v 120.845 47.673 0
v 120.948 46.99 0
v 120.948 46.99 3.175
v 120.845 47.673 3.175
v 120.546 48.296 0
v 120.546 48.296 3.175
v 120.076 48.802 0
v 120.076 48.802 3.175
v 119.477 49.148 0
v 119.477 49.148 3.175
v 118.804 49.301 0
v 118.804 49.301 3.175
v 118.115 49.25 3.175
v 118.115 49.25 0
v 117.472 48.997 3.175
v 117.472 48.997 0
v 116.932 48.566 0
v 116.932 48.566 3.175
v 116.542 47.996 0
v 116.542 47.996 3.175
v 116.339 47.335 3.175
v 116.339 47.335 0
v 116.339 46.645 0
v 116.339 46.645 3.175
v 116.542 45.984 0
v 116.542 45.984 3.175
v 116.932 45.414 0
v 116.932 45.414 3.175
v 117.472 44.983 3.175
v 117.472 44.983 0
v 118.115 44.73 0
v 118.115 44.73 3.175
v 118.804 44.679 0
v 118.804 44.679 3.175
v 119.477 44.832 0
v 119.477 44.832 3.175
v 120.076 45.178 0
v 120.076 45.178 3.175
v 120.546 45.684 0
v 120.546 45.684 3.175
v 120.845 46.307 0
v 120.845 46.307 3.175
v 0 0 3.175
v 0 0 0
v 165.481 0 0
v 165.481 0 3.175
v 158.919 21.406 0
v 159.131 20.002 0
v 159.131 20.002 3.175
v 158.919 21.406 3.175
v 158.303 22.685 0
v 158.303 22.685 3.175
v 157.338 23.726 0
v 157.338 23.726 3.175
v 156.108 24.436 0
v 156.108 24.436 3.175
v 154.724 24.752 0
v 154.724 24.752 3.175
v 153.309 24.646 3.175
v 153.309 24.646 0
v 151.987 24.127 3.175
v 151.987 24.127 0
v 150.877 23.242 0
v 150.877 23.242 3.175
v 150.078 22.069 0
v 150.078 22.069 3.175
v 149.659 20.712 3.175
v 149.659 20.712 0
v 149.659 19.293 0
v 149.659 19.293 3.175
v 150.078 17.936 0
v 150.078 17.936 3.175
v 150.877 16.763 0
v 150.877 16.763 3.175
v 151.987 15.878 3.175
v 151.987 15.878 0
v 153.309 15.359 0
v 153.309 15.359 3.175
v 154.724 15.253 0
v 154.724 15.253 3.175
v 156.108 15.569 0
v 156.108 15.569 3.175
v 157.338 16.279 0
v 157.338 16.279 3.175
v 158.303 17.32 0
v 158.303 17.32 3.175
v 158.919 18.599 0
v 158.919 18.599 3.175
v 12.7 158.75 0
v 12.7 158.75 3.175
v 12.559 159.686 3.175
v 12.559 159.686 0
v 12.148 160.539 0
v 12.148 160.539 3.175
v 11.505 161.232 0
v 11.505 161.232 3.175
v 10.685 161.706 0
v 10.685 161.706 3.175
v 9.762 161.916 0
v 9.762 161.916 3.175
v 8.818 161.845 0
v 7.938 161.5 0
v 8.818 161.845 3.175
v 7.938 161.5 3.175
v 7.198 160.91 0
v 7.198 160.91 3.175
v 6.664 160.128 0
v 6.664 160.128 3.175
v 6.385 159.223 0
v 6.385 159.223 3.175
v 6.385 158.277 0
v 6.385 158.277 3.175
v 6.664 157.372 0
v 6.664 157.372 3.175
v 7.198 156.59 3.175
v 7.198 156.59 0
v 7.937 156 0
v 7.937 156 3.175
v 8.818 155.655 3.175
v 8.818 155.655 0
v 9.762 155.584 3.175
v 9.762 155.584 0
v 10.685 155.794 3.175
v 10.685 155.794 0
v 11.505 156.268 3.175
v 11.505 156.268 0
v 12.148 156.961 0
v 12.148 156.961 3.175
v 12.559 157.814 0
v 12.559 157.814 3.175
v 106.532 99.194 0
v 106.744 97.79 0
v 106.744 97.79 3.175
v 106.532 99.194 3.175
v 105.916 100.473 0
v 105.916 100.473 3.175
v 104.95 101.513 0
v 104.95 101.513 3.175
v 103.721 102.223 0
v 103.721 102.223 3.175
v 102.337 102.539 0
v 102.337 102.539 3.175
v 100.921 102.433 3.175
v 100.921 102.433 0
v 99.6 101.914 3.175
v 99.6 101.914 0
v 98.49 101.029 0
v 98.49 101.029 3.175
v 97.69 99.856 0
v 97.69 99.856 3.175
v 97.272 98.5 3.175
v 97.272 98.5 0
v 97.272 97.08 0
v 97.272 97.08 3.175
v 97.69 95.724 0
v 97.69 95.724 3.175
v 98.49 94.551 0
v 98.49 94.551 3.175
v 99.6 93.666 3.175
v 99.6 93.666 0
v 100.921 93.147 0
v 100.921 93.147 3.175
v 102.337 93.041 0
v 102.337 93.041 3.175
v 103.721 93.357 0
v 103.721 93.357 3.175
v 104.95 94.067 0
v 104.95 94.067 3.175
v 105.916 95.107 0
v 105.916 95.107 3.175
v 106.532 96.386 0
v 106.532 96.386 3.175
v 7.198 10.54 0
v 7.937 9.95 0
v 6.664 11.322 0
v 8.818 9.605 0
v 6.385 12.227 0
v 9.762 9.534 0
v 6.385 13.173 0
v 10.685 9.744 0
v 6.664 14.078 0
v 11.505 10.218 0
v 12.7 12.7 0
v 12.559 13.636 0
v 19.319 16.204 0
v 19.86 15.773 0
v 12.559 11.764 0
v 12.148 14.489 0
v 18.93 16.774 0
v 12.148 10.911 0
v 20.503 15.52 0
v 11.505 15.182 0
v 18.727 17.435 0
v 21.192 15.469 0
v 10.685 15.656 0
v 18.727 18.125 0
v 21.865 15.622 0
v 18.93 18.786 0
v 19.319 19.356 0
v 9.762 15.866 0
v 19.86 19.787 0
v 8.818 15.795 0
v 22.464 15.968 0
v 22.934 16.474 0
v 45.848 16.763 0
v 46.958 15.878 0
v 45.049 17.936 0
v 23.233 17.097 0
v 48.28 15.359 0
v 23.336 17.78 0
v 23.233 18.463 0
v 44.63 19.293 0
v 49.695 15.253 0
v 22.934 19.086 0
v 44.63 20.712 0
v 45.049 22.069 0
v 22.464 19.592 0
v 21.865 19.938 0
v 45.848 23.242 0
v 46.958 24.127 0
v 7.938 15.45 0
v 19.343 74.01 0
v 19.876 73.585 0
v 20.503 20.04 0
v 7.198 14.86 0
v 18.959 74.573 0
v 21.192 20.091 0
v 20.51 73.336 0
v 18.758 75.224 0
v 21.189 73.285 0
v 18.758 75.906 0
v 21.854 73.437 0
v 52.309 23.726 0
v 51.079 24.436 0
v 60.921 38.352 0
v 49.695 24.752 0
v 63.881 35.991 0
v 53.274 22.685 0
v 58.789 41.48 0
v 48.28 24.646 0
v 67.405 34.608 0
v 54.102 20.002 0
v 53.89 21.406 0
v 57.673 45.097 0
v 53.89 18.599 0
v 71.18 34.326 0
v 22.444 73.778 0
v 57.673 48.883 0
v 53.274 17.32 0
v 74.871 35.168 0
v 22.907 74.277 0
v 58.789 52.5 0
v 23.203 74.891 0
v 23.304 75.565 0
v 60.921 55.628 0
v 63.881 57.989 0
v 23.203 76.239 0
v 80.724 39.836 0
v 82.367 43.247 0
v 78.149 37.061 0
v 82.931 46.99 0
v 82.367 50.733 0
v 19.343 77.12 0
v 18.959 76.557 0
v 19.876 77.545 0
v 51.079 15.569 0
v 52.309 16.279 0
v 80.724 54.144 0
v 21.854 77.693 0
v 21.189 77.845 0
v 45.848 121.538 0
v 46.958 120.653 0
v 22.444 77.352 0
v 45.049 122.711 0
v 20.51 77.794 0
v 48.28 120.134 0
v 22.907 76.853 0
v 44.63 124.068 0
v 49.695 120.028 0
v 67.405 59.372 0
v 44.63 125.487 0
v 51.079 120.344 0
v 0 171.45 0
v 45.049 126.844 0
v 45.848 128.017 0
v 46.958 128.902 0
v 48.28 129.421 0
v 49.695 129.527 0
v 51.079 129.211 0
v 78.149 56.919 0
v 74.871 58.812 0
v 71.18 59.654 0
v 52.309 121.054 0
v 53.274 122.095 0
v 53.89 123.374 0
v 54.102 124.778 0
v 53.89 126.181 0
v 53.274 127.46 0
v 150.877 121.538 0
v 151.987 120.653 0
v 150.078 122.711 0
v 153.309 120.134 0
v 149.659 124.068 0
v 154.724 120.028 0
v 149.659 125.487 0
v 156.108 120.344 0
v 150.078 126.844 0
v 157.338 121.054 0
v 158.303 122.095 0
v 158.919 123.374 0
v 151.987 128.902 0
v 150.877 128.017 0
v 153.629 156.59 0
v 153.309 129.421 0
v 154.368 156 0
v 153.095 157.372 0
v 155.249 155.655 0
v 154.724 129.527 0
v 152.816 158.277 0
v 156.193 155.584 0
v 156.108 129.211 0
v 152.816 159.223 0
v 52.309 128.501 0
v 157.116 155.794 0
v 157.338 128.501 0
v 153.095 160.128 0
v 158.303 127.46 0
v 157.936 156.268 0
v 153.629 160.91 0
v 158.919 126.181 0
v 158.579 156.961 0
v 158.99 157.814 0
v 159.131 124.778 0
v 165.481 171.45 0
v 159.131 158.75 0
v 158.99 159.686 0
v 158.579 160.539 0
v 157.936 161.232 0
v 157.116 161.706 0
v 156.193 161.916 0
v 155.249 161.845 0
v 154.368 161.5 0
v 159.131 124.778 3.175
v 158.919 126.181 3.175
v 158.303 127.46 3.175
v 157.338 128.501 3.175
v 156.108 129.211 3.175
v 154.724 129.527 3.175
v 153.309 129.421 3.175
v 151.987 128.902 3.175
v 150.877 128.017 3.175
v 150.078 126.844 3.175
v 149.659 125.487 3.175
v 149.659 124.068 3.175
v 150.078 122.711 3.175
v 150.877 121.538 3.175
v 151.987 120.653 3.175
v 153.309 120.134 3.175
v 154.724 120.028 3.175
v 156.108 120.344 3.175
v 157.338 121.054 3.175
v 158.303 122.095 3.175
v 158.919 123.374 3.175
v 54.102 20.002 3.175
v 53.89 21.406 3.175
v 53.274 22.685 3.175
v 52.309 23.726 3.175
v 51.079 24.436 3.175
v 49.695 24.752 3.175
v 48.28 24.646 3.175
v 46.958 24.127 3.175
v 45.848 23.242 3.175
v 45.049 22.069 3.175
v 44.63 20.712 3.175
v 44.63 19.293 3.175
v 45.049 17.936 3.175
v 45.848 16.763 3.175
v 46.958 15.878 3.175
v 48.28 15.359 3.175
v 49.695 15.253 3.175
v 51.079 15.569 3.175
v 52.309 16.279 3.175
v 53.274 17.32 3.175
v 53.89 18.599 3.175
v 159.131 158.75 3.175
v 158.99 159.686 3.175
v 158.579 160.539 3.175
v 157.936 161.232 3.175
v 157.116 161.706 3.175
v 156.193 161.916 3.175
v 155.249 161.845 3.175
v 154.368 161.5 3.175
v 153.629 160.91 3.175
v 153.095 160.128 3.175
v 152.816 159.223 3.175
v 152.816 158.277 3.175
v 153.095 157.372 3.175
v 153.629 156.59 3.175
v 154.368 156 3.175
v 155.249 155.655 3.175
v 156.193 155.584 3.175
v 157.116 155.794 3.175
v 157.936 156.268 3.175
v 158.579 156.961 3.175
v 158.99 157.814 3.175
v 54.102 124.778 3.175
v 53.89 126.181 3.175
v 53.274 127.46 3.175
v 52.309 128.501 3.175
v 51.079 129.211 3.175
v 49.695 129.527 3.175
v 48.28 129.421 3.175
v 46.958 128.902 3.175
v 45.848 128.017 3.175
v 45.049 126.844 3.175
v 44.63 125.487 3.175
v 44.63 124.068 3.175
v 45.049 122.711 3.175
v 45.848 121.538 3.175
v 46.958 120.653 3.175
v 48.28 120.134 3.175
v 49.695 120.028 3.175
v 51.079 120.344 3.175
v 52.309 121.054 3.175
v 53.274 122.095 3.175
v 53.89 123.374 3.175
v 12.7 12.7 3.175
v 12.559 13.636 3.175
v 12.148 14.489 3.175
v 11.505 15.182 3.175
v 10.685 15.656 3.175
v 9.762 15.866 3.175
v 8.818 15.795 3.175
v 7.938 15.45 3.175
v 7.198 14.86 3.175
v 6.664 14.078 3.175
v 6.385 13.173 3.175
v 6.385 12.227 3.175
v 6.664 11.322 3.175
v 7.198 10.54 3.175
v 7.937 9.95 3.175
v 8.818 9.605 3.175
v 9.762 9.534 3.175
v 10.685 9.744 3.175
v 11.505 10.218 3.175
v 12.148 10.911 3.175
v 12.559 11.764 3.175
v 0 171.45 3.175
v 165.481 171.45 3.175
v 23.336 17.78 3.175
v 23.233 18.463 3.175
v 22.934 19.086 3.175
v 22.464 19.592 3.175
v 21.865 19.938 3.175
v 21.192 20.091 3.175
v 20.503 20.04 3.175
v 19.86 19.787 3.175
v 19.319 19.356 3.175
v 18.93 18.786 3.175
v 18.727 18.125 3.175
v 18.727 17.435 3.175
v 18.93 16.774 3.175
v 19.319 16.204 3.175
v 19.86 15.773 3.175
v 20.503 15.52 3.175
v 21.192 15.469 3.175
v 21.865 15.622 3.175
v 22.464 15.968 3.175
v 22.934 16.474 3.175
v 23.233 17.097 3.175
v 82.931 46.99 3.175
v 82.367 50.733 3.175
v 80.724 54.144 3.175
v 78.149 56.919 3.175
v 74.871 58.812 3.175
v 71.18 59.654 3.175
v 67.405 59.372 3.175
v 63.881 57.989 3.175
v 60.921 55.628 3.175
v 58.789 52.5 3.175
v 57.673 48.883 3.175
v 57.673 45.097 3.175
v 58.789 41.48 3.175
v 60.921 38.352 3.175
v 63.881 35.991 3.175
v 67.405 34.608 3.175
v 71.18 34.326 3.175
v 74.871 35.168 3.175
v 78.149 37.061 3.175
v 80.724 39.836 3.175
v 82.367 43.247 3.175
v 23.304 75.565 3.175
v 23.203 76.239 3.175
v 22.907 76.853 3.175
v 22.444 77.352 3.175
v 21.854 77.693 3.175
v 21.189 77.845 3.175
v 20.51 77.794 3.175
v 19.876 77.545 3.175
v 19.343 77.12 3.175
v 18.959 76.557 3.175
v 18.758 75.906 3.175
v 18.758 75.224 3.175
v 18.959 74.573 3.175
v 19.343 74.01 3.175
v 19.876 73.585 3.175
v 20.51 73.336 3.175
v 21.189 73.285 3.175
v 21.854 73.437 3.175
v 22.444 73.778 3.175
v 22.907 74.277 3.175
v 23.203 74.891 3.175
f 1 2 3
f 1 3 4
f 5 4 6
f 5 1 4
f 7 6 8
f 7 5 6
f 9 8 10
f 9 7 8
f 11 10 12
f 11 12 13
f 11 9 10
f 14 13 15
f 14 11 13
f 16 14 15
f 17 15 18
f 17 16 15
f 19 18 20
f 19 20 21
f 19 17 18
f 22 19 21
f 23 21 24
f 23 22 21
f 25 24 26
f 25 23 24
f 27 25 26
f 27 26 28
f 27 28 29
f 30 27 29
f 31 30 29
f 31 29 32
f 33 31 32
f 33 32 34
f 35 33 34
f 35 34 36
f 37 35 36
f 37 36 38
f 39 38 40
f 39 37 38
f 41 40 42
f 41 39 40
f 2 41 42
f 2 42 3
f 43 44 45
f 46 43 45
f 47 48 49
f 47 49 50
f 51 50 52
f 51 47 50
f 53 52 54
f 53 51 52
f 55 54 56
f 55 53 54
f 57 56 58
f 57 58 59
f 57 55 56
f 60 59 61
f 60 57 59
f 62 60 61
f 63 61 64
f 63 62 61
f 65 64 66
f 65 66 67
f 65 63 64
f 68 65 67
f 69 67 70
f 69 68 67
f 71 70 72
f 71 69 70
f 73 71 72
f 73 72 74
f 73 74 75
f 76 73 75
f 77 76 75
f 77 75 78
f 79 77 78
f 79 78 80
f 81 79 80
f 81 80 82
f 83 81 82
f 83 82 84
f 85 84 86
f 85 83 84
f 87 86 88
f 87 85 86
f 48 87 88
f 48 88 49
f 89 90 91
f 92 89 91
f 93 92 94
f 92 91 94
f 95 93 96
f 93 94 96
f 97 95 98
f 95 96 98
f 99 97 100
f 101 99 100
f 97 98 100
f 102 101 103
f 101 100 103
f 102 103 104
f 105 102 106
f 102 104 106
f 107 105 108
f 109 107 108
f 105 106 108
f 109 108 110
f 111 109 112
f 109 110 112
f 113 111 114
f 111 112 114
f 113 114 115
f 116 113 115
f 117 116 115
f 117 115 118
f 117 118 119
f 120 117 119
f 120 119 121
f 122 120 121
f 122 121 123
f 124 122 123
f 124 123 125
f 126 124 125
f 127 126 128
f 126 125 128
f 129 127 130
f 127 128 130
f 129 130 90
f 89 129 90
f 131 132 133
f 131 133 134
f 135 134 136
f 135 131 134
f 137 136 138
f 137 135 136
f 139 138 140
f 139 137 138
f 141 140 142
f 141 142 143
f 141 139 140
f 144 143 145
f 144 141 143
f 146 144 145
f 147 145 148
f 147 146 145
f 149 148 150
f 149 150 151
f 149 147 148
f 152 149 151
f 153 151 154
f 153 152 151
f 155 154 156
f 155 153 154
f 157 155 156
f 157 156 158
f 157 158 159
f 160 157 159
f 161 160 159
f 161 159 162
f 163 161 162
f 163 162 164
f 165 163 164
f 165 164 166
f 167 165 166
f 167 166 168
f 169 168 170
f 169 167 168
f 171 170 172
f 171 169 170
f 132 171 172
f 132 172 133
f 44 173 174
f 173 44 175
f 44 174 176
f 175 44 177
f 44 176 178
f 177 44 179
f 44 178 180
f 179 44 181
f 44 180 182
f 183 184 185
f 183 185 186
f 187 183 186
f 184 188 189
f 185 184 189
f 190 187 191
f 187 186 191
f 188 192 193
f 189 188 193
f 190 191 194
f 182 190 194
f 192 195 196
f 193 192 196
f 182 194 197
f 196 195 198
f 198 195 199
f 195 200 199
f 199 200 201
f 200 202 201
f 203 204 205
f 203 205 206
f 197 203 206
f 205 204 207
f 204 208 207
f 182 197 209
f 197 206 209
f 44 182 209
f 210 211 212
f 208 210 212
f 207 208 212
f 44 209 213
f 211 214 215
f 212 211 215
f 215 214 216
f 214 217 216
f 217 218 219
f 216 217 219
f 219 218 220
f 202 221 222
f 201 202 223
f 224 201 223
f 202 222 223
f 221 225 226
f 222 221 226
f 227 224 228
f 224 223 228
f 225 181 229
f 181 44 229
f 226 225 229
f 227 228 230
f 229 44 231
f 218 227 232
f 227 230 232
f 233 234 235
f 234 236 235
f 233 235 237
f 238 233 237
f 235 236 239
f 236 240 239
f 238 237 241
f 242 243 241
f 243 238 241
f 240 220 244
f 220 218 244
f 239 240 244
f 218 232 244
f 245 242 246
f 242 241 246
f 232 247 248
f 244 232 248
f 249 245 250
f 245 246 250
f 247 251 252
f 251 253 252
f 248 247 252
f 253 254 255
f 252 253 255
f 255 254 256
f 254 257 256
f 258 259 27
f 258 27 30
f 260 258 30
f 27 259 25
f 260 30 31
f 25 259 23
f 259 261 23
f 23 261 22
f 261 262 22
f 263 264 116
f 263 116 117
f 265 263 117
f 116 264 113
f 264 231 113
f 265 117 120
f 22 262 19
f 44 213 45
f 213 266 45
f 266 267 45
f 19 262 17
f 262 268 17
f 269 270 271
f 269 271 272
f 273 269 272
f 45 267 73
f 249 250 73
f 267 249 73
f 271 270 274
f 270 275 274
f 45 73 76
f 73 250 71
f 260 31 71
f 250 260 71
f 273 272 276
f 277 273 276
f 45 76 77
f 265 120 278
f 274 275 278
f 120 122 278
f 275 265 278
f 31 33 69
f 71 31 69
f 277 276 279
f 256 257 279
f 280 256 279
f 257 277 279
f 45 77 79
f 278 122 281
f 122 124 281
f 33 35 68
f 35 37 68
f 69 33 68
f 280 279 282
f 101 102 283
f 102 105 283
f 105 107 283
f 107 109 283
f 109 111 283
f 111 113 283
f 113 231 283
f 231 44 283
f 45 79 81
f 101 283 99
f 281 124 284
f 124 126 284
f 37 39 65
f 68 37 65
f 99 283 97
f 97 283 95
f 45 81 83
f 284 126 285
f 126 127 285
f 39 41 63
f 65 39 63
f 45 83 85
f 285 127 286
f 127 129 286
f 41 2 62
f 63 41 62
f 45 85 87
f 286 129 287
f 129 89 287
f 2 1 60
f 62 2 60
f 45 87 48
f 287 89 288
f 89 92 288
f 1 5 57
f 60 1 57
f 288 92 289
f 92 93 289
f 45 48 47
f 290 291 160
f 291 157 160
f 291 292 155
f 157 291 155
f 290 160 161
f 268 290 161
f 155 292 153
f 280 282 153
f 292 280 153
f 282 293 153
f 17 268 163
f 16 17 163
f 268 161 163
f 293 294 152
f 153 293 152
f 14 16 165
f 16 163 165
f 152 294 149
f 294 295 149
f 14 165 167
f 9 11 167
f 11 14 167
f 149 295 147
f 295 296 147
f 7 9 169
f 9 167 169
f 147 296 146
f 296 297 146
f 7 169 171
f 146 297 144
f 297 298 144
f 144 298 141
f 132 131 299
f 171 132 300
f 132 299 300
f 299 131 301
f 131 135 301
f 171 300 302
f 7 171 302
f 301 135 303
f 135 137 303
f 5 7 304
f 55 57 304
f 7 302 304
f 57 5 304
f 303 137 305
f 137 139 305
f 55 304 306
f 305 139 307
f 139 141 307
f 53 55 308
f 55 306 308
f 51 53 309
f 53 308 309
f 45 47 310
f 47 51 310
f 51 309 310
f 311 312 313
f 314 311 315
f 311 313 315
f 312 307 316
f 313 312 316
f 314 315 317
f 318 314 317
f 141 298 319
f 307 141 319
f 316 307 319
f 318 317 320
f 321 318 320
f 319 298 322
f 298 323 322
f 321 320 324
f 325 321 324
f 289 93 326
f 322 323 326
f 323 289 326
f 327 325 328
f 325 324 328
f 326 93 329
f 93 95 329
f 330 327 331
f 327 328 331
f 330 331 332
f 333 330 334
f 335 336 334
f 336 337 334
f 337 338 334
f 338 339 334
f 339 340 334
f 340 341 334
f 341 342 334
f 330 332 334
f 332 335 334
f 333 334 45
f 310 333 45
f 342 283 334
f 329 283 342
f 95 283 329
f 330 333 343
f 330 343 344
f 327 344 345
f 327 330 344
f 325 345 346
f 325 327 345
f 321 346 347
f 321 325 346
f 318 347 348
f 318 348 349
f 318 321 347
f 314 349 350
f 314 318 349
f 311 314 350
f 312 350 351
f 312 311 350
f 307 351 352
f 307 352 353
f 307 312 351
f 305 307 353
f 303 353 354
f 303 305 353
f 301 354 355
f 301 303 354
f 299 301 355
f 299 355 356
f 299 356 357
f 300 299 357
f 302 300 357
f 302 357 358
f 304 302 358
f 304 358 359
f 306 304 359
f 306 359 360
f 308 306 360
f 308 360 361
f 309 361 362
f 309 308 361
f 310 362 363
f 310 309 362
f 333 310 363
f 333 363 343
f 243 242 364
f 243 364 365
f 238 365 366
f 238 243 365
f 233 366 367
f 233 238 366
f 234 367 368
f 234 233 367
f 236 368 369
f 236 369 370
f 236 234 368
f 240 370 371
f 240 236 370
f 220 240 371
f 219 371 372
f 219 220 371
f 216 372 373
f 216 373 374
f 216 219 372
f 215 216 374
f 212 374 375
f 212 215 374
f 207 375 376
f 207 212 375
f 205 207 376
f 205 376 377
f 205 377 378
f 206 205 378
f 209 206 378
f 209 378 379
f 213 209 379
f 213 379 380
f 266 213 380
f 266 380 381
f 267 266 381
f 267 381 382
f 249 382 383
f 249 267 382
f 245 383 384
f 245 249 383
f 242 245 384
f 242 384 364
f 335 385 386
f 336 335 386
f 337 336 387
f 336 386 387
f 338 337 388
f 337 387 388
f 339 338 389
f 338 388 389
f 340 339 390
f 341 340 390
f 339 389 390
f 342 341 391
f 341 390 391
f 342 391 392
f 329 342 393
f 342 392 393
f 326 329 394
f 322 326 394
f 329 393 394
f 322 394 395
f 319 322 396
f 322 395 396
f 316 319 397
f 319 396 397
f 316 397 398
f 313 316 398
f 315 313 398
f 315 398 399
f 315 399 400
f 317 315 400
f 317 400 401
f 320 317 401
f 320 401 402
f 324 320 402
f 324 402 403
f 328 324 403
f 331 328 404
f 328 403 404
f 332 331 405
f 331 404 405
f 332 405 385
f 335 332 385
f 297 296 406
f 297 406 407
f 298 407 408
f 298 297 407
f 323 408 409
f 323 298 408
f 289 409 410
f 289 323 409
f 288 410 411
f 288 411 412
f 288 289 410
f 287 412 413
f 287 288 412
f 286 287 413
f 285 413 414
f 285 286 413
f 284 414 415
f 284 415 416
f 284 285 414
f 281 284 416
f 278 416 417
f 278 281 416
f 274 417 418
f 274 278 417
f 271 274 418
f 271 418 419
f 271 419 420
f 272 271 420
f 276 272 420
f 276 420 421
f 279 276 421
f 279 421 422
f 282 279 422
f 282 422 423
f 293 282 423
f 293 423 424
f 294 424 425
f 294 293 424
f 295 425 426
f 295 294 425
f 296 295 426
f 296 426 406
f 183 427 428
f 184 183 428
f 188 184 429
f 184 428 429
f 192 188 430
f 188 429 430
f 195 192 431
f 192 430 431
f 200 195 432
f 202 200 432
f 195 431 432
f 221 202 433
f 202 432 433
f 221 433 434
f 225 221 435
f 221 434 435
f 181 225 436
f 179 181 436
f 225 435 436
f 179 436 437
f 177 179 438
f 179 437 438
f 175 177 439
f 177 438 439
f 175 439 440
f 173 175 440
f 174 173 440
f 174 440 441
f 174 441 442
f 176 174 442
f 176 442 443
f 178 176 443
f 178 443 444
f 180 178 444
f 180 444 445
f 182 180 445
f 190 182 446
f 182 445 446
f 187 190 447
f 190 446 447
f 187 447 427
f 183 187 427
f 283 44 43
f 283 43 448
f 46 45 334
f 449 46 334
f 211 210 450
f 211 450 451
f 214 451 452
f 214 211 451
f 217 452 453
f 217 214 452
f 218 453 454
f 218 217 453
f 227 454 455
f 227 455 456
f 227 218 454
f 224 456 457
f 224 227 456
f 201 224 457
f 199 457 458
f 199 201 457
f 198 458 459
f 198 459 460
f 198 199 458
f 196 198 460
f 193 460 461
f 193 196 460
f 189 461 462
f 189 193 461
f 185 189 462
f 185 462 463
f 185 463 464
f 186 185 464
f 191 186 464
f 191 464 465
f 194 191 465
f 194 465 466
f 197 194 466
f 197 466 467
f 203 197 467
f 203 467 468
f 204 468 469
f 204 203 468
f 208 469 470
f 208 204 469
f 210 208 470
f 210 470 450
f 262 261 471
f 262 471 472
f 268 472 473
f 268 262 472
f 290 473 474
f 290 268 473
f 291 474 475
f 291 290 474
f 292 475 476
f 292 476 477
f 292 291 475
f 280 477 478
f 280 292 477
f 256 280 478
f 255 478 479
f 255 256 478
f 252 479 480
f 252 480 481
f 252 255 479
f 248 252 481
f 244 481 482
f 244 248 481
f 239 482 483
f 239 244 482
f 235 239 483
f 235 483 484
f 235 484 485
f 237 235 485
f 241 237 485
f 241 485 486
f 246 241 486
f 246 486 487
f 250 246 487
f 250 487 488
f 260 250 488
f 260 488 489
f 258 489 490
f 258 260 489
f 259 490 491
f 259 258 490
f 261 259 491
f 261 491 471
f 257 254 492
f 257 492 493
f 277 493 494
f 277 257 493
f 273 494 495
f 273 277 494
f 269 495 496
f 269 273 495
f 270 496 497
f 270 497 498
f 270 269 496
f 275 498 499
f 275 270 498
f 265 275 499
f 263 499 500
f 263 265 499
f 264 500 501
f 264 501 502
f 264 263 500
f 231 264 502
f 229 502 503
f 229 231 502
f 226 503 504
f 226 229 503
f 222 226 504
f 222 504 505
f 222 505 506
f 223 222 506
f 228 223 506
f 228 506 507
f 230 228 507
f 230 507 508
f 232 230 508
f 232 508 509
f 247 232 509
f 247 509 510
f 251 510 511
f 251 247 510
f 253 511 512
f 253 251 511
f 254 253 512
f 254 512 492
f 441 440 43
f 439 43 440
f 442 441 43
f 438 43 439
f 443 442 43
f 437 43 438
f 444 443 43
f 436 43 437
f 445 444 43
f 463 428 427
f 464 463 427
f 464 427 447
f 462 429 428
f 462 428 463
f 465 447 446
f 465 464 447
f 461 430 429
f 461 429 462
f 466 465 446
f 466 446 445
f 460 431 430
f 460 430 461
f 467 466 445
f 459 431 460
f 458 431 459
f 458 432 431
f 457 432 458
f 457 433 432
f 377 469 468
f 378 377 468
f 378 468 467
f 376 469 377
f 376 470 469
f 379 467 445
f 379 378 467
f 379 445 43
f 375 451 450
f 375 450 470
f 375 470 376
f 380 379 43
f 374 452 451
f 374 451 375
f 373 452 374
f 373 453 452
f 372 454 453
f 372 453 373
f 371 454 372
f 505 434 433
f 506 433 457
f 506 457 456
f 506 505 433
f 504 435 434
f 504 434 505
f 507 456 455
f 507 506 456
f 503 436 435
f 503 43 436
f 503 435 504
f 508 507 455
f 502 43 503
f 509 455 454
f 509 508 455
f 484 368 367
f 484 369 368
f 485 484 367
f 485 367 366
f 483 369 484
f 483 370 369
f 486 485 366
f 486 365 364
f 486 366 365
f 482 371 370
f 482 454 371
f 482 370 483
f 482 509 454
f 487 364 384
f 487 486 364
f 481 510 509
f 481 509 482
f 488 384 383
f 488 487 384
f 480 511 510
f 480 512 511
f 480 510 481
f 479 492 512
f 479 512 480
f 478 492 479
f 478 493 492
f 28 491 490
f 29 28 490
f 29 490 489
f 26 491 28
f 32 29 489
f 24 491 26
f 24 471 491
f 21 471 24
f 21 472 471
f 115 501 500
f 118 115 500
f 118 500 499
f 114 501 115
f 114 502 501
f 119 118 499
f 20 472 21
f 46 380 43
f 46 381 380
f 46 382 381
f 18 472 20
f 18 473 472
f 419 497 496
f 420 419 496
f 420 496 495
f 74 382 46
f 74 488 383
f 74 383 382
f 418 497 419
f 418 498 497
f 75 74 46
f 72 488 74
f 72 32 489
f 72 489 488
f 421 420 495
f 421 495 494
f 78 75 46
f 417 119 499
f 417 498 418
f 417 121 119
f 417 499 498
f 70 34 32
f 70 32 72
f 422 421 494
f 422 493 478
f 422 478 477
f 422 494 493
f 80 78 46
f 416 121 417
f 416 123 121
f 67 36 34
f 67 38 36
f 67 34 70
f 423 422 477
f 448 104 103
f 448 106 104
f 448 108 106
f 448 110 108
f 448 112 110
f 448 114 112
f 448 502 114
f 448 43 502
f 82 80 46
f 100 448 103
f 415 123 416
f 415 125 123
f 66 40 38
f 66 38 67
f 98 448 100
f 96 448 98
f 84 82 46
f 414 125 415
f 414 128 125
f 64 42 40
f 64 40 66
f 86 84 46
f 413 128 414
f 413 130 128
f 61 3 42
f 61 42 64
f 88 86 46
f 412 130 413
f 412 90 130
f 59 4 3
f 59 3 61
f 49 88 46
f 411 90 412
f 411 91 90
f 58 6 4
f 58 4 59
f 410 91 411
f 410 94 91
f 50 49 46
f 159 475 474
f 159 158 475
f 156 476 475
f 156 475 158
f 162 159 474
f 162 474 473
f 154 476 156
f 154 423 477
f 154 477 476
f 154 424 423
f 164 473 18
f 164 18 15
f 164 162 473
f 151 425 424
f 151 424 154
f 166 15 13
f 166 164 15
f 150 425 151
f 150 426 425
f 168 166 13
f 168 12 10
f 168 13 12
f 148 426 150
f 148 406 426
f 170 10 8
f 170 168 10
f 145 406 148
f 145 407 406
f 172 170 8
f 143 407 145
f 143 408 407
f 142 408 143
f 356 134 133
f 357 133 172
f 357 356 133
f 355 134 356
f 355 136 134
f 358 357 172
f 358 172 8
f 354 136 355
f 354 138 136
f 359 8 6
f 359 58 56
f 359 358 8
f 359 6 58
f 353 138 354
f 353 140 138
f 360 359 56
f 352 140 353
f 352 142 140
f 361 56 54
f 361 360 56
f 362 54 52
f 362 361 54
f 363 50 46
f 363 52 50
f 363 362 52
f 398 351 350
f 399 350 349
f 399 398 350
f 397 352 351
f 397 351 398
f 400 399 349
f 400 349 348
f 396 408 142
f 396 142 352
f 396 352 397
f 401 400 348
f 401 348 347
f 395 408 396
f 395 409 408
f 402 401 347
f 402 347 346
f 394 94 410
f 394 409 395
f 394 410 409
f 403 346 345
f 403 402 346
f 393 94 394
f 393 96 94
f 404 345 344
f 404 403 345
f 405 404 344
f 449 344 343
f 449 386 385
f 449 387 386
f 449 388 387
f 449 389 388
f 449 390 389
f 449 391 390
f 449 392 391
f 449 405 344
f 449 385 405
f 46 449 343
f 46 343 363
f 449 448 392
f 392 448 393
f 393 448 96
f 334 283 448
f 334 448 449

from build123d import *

# Parameters (mm, degrees)
SKETCH1_W           = 165.481
SKETCH1_H           = 171.45
SKETCH1_R           = 2.31775
SKETCH1_R_2         = 2.286
SKETCH1_R_3         = 12.7
SKETCH1_R_4         = 4.7625
BOSS_EXTRUDE1_DEPTH = 3.175
SKETCH2_R           = 3.175
CUT_EXTRUDE1_DEPTH  = 3.175


with BuildPart() as part:
    # Sketch1 → Boss-Extrude1 (new body)
    with BuildSketch(Plane.XY):
        with Locations((82.7405, 85.725)):
            Rectangle(SKETCH1_W, SKETCH1_H)
        with Locations((21.0185, 17.78)):
            Circle(SKETCH1_R, mode=Mode.SUBTRACT)
        with Locations((21.0185, 75.565)):
            Circle(SKETCH1_R_2, mode=Mode.SUBTRACT)
        with Locations((118.6307, 46.99)):
            Circle(SKETCH1_R, mode=Mode.SUBTRACT)
        with Locations((70.231, 46.99)):
            Circle(SKETCH1_R_3, mode=Mode.SUBTRACT)
        with Locations((101.981, 97.79)):
            Circle(SKETCH1_R_4, mode=Mode.SUBTRACT)
        with Locations((49.3395, 20.0025)):
            Circle(SKETCH1_R_4, mode=Mode.SUBTRACT)
        with Locations((49.3395, 124.7775)):
            Circle(SKETCH1_R_4, mode=Mode.SUBTRACT)
        with Locations((154.3685, 20.0025)):
            Circle(SKETCH1_R_4, mode=Mode.SUBTRACT)
        with Locations((154.3685, 124.7775)):
            Circle(SKETCH1_R_4, mode=Mode.SUBTRACT)
    extrude(amount=BOSS_EXTRUDE1_DEPTH)

    # Sketch2 → Cut-Extrude1 (cut)
    with BuildSketch(Plane.XY.offset(3.175)):
        with Locations((9.525, 158.75)):
            Circle(SKETCH2_R)
        with Locations((9.525, 12.7)):
            Circle(SKETCH2_R)
        with Locations((155.956, 158.75)):
            Circle(SKETCH2_R)
    extrude(amount=-CUT_EXTRUDE1_DEPTH, mode=Mode.SUBTRACT)


solid = part.part
